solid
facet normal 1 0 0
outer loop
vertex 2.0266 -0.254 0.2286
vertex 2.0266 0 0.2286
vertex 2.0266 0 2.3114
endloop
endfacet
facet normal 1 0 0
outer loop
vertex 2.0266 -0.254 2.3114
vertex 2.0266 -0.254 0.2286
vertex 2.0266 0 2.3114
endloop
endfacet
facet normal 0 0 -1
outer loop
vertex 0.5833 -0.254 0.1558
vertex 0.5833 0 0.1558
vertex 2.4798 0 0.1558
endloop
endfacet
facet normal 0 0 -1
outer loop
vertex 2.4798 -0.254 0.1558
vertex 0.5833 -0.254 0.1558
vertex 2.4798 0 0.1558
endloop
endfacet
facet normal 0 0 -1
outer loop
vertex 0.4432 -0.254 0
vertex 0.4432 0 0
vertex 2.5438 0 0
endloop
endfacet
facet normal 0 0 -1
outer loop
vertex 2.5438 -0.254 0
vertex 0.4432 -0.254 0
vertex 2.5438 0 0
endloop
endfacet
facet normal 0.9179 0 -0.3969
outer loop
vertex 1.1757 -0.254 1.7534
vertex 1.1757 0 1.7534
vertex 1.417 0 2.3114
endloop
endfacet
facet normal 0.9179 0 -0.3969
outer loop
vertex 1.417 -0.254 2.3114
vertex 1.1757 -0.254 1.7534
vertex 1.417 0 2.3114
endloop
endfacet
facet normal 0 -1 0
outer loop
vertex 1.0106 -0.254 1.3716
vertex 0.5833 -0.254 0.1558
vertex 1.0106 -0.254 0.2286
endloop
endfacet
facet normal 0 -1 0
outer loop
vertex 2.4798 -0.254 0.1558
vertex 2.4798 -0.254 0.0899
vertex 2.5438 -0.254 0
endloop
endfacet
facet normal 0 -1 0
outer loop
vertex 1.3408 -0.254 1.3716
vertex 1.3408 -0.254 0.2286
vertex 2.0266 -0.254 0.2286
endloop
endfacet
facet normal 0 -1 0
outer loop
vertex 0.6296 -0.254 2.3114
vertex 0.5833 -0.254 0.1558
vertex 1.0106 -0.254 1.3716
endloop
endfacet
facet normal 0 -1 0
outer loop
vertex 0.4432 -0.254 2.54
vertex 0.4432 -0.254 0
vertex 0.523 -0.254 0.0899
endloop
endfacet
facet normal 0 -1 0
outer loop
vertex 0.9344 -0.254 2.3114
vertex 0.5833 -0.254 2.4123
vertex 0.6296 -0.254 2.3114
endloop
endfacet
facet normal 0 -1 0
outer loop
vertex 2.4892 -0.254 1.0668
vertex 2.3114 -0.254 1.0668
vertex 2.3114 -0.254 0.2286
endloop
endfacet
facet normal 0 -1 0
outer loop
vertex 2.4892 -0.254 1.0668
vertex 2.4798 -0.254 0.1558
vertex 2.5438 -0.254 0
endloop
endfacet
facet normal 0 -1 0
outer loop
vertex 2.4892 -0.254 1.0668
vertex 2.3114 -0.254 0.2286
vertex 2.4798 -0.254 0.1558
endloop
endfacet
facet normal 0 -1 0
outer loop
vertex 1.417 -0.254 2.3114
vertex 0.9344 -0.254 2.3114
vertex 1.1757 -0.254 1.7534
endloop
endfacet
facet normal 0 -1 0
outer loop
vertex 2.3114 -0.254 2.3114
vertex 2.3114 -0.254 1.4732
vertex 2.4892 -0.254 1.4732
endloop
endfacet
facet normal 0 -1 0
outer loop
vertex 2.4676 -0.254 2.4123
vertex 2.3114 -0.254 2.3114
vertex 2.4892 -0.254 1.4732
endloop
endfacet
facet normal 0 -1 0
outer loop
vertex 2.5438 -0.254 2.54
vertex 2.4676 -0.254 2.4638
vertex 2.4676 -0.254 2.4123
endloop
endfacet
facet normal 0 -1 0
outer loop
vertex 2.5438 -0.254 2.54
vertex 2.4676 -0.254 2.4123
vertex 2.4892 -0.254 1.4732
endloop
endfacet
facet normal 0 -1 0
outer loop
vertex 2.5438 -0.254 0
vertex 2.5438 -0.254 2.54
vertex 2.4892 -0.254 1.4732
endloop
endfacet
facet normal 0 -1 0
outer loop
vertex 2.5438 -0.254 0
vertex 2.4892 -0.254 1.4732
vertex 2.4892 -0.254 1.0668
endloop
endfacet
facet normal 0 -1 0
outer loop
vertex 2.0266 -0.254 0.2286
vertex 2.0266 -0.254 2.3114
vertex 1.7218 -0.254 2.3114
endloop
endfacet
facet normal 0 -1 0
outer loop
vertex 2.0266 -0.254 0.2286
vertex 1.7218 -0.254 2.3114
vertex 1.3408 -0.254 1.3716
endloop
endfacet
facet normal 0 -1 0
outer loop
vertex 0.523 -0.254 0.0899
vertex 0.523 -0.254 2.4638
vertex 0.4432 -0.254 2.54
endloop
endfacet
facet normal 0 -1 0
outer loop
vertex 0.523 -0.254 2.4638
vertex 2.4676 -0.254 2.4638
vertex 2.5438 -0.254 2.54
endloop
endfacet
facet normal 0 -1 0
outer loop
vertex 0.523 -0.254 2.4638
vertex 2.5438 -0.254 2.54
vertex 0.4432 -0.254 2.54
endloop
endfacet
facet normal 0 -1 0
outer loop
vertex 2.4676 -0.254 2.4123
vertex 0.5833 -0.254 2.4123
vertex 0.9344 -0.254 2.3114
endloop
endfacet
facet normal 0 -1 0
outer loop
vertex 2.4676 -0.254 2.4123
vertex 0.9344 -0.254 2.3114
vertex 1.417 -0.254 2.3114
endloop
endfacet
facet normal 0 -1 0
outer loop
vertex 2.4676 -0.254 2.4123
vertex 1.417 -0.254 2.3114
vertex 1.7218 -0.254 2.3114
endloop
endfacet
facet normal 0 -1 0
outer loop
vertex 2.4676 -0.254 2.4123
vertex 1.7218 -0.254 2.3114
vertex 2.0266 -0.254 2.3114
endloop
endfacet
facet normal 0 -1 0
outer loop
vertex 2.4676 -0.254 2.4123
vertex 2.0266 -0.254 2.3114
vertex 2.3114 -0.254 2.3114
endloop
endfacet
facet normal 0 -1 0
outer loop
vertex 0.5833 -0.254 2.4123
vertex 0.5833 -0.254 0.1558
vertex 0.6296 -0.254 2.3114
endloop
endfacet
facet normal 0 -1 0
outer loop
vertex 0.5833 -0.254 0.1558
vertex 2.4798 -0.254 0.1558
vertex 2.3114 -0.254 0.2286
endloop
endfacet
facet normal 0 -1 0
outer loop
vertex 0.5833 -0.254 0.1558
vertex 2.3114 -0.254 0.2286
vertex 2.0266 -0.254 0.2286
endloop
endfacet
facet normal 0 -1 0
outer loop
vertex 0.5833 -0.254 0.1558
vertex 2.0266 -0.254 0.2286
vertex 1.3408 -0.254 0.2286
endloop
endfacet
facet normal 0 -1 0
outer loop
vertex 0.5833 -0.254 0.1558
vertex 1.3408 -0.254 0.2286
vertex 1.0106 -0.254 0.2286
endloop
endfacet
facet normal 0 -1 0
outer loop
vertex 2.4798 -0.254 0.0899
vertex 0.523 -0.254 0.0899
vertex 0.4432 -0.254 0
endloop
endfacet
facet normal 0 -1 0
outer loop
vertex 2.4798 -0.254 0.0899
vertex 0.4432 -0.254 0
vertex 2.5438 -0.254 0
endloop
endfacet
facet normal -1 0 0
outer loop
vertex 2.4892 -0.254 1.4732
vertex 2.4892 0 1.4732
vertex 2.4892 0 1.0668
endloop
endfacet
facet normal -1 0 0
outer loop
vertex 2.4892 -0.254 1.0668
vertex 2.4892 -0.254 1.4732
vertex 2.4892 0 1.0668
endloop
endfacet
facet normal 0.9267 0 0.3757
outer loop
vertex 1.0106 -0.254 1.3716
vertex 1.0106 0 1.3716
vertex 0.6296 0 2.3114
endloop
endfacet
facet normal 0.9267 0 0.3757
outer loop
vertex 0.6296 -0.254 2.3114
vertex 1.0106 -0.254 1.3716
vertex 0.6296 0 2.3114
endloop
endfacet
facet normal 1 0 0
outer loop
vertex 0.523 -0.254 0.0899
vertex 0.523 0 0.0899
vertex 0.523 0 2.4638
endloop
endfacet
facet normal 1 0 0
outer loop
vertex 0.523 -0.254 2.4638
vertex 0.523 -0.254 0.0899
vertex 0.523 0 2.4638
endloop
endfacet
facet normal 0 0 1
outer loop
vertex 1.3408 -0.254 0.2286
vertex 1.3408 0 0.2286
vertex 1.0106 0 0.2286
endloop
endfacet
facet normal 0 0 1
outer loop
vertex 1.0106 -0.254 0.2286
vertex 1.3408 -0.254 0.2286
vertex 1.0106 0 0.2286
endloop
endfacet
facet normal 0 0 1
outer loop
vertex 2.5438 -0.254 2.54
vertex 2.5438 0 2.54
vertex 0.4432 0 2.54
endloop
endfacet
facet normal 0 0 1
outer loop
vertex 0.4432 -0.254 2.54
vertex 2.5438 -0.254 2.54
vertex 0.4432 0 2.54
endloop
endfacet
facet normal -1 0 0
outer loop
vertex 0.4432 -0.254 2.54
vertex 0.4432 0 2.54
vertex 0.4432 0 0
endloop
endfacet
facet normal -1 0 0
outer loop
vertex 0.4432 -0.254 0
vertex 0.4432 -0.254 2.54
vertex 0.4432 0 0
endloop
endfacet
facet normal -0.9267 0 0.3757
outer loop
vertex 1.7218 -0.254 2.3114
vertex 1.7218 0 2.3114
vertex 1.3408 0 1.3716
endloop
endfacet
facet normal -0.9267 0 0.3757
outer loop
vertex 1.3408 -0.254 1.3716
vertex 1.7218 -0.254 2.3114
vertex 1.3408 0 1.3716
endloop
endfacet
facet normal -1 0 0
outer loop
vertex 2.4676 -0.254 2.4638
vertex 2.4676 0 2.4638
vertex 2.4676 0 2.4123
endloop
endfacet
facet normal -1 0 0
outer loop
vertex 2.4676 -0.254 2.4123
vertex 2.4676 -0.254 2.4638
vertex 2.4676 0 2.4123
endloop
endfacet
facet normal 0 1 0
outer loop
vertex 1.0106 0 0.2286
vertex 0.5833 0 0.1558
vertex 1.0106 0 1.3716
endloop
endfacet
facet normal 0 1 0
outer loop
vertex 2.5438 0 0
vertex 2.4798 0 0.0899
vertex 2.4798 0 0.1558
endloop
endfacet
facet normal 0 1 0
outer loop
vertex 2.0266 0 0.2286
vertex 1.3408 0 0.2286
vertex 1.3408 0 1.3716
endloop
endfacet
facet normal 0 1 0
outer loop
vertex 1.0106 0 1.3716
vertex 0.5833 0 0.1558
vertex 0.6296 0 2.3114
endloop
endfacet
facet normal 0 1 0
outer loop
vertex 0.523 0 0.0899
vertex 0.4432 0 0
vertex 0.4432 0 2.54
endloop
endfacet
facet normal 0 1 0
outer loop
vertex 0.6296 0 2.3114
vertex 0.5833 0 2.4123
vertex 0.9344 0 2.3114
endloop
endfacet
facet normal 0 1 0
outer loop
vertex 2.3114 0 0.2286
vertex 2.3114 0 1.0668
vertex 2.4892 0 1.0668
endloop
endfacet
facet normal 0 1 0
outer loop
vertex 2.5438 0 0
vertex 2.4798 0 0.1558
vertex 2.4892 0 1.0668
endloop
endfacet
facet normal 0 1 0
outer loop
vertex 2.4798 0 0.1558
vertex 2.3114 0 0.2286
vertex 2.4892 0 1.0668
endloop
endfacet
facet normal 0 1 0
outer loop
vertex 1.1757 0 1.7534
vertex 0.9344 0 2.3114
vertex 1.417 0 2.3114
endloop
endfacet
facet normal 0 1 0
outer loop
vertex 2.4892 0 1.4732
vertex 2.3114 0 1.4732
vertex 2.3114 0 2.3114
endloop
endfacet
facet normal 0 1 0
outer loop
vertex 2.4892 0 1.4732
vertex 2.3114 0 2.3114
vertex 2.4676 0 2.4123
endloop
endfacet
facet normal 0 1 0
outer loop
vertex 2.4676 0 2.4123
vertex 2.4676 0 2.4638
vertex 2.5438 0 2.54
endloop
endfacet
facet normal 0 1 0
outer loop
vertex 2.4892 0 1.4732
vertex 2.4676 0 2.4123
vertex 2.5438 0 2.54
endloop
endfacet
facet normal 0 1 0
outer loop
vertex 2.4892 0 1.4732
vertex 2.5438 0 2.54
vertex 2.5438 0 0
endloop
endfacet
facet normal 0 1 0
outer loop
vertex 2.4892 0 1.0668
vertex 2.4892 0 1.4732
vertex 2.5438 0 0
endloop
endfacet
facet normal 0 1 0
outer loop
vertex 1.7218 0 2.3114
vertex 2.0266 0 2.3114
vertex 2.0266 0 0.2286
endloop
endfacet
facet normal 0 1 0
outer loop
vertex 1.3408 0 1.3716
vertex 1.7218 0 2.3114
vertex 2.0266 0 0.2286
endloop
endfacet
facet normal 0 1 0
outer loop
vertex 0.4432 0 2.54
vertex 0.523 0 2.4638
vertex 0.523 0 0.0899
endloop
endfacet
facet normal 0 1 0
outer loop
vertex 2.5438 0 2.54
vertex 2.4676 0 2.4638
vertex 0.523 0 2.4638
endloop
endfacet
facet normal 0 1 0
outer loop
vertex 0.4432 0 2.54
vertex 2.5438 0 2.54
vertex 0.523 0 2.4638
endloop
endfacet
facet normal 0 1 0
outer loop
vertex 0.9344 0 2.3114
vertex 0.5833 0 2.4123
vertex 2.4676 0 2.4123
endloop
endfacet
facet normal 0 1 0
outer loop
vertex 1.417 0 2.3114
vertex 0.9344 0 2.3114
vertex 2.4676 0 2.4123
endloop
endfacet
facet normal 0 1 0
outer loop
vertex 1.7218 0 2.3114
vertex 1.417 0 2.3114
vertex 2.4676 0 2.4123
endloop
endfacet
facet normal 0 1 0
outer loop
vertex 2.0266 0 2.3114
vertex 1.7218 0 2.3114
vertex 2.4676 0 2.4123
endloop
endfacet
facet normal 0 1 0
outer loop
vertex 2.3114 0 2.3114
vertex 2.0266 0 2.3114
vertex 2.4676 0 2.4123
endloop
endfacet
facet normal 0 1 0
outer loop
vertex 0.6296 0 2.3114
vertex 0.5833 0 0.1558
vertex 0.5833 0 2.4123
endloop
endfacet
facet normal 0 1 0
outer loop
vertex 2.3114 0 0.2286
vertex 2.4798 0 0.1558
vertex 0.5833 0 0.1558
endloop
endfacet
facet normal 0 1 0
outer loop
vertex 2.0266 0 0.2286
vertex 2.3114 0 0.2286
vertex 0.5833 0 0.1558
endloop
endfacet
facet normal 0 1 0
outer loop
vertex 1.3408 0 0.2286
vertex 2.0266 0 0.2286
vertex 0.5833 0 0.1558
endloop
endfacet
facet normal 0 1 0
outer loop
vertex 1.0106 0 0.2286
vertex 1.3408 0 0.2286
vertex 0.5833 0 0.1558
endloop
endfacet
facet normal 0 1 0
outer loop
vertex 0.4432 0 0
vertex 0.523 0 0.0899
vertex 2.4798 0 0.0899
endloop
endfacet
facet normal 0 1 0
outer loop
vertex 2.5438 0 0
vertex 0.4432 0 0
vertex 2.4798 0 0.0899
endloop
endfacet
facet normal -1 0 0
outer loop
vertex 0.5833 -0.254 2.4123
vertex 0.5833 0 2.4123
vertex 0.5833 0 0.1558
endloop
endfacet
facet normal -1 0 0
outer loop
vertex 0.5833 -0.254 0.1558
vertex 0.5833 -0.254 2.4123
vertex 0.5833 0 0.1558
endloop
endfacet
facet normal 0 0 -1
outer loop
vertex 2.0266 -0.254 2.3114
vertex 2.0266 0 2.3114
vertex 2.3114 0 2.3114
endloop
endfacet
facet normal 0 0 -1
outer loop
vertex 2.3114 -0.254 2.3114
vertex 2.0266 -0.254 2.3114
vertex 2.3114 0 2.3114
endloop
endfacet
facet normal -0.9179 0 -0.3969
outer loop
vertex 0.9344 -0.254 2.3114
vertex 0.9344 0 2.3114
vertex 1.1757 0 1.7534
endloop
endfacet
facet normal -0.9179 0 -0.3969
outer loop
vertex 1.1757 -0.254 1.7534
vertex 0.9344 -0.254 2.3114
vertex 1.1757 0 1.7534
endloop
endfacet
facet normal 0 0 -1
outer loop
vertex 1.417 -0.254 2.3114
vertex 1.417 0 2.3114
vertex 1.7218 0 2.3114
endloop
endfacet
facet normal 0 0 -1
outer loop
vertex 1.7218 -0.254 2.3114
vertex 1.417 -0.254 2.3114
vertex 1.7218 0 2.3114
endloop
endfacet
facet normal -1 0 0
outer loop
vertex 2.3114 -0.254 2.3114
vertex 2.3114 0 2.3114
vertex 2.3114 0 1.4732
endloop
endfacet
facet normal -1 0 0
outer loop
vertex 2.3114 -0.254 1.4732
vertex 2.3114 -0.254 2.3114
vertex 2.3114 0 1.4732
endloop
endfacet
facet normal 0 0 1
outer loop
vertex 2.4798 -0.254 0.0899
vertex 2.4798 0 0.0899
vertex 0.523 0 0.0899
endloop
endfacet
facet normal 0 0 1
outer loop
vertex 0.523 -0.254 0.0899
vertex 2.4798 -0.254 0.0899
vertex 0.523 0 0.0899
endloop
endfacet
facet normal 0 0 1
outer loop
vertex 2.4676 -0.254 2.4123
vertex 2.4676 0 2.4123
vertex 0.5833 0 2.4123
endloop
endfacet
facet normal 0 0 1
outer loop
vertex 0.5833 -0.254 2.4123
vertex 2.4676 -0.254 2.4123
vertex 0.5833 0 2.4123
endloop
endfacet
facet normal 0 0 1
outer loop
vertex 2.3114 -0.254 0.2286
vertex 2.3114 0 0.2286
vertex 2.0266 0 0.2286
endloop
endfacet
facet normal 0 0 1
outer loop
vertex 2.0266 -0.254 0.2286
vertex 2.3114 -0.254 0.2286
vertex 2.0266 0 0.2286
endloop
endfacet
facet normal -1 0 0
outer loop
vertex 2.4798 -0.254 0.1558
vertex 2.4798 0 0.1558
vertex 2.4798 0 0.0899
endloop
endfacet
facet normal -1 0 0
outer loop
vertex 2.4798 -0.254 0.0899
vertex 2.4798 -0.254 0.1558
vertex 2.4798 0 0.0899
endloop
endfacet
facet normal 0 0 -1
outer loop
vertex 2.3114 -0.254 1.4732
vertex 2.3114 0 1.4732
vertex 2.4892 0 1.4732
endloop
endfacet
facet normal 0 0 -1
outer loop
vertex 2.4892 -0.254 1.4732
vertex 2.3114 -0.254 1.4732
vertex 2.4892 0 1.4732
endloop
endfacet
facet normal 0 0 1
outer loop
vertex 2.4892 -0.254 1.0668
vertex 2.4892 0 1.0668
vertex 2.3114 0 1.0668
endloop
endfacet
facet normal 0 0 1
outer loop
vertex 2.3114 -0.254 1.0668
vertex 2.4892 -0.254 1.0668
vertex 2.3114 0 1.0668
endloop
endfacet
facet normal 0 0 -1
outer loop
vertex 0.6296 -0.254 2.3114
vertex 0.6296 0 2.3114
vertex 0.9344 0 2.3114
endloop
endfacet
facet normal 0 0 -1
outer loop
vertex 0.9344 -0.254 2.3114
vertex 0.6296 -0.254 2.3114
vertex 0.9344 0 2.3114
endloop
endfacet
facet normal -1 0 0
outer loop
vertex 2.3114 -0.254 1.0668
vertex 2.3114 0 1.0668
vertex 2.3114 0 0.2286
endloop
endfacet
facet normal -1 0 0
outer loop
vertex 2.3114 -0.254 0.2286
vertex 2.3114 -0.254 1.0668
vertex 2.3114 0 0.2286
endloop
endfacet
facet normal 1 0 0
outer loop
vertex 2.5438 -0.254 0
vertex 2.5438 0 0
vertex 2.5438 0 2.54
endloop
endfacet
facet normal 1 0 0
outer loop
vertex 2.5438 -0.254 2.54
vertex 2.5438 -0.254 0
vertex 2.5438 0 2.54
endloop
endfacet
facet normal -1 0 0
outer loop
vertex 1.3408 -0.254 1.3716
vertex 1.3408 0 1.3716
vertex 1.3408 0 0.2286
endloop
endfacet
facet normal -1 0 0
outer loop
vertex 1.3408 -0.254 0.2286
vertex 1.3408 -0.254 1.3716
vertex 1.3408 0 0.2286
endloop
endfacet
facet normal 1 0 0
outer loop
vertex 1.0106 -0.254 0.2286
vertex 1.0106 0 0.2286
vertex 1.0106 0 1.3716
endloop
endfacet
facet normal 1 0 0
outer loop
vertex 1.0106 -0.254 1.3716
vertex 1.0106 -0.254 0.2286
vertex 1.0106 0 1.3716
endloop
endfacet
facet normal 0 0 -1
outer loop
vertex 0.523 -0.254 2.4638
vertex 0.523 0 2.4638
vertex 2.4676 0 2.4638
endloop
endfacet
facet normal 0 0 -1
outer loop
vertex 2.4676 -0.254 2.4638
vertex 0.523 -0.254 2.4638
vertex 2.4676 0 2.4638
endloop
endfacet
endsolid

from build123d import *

# Parameters (mm, degrees)
F0_W     = 0.0762
F0_H     = 0.0762
F1_DEPTH = 0.254


with BuildPart() as f1:
    # F0 (on Front) → F1 (new body)
    with BuildSketch(Plane.XZ):
        with Locations((2.505707, 2.5019)):
            Rectangle(F0_W, F0_H)
        Polygon((0.443168, 0), (2.543807, 0), (2.543807, 2.4638), (2.467607, 2.4638), (2.467607, 2.54), (0.443168, 2.54), align=None)
        Polygon((1.340803, 0.2286), (1.010603, 0.2286), (1.010603, 1.3716), (0.629603, 2.3114), (0.934403, 2.3114), (1.175703, 1.753394), (1.417003, 2.3114), (1.721803, 2.3114), (1.340803, 1.3716), align=None, mode=Mode.SUBTRACT)
        Polygon((2.026603, 2.3114), (2.3114, 2.3114), (2.3114, 1.4732), (2.4892, 1.4732), (2.4892, 1.0668), (2.3114, 1.0668), (2.3114, 0.2286), (2.026603, 0.2286), align=None, mode=Mode.SUBTRACT)
        Polygon((0.523031, 2.4638), (2.467607, 2.4638), (2.467607, 2.412301), (0.583308, 2.412301), (0.583308, 0.15577), (2.479824, 0.15577), (2.479824, 0.089892), (0.583308, 0.089892), (0.523031, 0.089892), align=None, mode=Mode.SUBTRACT)
    extrude(amount=F1_DEPTH)


solid = f1.part
